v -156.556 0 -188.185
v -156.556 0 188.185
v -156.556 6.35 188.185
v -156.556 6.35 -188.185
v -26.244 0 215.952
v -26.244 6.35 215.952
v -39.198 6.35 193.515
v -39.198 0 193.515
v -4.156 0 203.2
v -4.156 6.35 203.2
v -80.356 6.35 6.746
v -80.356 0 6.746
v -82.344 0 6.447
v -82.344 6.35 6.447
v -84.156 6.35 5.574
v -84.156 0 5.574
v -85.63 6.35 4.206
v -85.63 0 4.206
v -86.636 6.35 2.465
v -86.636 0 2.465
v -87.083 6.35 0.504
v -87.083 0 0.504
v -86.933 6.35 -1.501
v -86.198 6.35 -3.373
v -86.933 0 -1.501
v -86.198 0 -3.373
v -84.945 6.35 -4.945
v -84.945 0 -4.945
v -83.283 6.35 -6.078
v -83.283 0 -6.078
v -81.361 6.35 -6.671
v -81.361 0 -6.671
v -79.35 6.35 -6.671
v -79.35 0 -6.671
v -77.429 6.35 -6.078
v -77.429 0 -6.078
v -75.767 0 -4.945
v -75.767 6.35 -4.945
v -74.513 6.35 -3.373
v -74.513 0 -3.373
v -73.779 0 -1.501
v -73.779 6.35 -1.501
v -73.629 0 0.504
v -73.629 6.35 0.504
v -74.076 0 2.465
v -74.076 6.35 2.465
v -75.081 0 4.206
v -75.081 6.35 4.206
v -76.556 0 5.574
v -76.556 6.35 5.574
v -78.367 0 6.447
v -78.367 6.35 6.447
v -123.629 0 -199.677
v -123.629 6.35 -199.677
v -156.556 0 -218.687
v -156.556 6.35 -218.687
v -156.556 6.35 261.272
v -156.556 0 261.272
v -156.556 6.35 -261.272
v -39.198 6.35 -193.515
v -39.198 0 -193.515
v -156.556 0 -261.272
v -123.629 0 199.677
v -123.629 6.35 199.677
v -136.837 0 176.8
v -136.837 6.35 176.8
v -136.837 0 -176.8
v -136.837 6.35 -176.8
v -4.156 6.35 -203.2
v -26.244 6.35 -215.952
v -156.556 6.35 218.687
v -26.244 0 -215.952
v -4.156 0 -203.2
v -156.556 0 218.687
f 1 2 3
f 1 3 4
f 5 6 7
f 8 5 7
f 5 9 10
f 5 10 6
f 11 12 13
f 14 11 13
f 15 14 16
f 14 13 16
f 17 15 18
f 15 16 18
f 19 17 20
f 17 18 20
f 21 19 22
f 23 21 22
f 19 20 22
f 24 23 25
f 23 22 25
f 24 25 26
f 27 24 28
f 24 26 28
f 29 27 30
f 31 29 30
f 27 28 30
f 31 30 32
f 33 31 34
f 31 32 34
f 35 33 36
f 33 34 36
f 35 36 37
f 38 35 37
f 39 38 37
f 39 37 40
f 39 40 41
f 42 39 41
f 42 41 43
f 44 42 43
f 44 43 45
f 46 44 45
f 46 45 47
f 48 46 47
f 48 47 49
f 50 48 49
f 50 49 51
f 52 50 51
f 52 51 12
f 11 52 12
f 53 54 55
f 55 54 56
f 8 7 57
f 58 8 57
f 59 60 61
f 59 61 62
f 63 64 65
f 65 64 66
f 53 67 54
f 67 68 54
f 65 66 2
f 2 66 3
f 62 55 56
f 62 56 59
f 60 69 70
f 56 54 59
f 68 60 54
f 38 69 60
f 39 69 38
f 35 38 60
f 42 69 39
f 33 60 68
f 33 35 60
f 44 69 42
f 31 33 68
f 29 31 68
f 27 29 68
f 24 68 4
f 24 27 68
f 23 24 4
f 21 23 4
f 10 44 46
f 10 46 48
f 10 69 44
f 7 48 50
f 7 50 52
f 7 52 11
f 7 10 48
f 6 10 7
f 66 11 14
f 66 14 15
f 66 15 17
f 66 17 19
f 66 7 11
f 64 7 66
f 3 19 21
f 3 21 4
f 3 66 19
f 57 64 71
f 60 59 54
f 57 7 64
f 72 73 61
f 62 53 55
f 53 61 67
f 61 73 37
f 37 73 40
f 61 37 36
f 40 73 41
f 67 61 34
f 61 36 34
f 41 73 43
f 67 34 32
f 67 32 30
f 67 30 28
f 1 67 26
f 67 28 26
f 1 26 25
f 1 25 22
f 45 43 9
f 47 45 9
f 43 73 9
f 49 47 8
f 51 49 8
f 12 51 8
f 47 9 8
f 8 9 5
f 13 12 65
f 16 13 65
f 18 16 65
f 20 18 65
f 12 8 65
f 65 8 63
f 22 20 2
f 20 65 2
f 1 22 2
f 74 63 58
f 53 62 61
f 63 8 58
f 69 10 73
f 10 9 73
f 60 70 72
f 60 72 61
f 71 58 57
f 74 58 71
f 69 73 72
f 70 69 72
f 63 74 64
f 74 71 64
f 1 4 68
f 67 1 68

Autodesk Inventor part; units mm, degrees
ref_plane "YZ Plane" through (0, 0, 0) normal (1, 0, 0) x (0, 1, 0)
ref_plane "XZ Plane" through (0, 0, 0) normal (0, 1, 0) x (-1, 0, 0)
ref_plane "XY Plane" through (0, 0, 0) normal (0, 0, 1) x (1, 0, 0)
sketch "Sketch1" plane through (0, 0, 0) normal (0, 1, 0) x (-1, 0, 0)
  line L0 (4.1559, 203.2) -> (4.1559, -203.2)
  line L1 (4.1559, -203.2) -> (156.5559, -291.1882)
  line L2 (4.1559, 203.2) -> (156.5559, 291.1882)
  line L3 (4.1559, 203.2) -> (180.1322, 203.2) construction
  line L4 (156.5559, 291.1882) -> (156.5559, -291.1882)
  point P0 (0, 0)
  point P1 (4.1559, 0)
  dimension "d0" = 120
  dimension "d1" = 30
  dimension "d2" = 406.4
  dimension "d5" = 152.4
extrude "Extrusion1" add sketch "Sketch1" along normal blind 6.35
sketch "Sketch3" plane through (0, 6.35, 0) normal (0, 1, 0) x (1, 0, 0)
  line L0 (-1236.8748, 812.4936) -> (-137.0225, 177.4936) projected
  line L1 (-1224.1748, 834.4907) -> (-1236.8748, 812.4936) projected
  line L2 (-124.3225, 199.4907) -> (-1224.1748, 834.4907) projected
  line L3 (-137.0225, 177.4936) -> (-124.3225, 199.4907) projected
  line L4 (-26.6836, 216.2064) -> (-1258.5181, 927.4064) projected
  line L5 (-39.3836, 194.2093) -> (-26.6836, 216.2064) projected
  line L6 (-1271.2181, 905.4093) -> (-39.3836, 194.2093) projected
  line L7 (-1258.5181, 927.4064) -> (-1271.2181, 905.4093) projected
  line L8 (-1258.5181, -927.4064) -> (-26.6836, -216.2064) projected
  line L9 (-1271.2181, -905.4093) -> (-1258.5181, -927.4064) projected
  line L10 (-39.3836, -194.2093) -> (-1271.2181, -905.4093) projected
  line L11 (-26.6836, -216.2064) -> (-39.3836, -194.2093) projected
  line L12 (-137.0225, -177.4936) -> (-1236.8748, -812.4936) projected
  line L13 (-124.3225, -199.4907) -> (-137.0225, -177.4936) projected
  line L14 (-1224.1748, -834.4907) -> (-124.3225, -199.4907) projected
  line L15 (-1236.8748, -812.4936) -> (-1224.1748, -834.4907) projected
  line L16 (-156.5559, 291.1882) -> (-156.5559, -291.1882) projected
  line L17 (-156.5559, -218.1006) -> (-156.5559, -188.7712)
  line L18 (-156.5559, -188.7712) -> (-137.0225, -177.4936)
  line L19 (-137.0225, -177.4936) -> (-124.3225, -199.4907)
  line L20 (-124.3225, -199.4907) -> (-156.5559, -218.1006)
  line L21 (-136.8366, -176.7997) -> (-157.0639, -188.4779)
  line L22 (-157.0639, -188.4779) -> (-157.0639, -218.9805)
  line L23 (-157.0639, -218.9805) -> (-123.6286, -199.6766)
  line L24 (-123.6286, -199.6766) -> (-136.8366, -176.7997)
  line L25 (-156.5559, -261.8588) -> (-156.5559, -291.1882)
  line L26 (-156.5559, -291.1882) -> (-26.6836, -216.2064)
  line L27 (-156.5559, -291.1882) -> (-4.1559, -203.2) projected
  line L28 (-26.6836, -216.2064) -> (-39.3836, -194.2093)
  line L29 (-39.3836, -194.2093) -> (-156.5559, -261.8588)
  line L30 (-157.0639, -261.5655) -> (-157.0639, -292.0681)
  line L31 (-157.0639, -292.0681) -> (-25.9896, -216.3923)
  line L32 (-25.9896, -216.3923) -> (-39.1976, -193.5154)
  line L33 (-39.1976, -193.5154) -> (-157.0639, -261.5655)
  line L34 (-156.5559, 218.1006) -> (-156.5559, 188.7712)
  line L35 (-156.5559, 188.7712) -> (-137.0225, 177.4936)
  line L36 (-137.0225, 177.4936) -> (-124.3225, 199.4907)
  line L37 (-124.3225, 199.4907) -> (-156.5559, 218.1006)
  line L38 (-157.0639, 218.9805) -> (-157.0639, 188.4779)
  line L39 (-157.0639, 188.4779) -> (-136.8366, 176.7997)
  line L40 (-136.8366, 176.7997) -> (-123.6286, 199.6766)
  line L41 (-123.6286, 199.6766) -> (-157.0639, 218.9805)
  line L42 (-156.5559, 261.8588) -> (-156.5559, 291.1882)
  line L43 (-156.5559, 291.1882) -> (-26.6836, 216.2064)
  line L44 (-26.6836, 216.2064) -> (-39.3836, 194.2093)
  line L45 (-39.3836, 194.2093) -> (-156.5559, 261.8588)
  line L46 (-157.0639, 261.5655) -> (-157.0639, 292.0681)
  line L47 (-157.0639, 292.0681) -> (-25.9896, 216.3923)
  line L48 (-25.9896, 216.3923) -> (-39.1976, 193.5154)
  line L49 (-39.1976, 193.5154) -> (-157.0639, 261.5655)
  point P0 (0, 0)
  dimension "d6" = 0.508
  dimension "d7" = 0.508
  dimension "d8" = 0.508
  dimension "d9" = 0.508
extrude "Extrusion2" cut sketch "Sketch3" against normal through all contours L16 L2 L3 L0 | L16 L39 L38 L0 | L0 L38 L2 L16 | L0 L3 L2 L16 L41 L40 L39 | L49 L46 L6 L16 | L16 L6 L5 L4 L46 L47 L48 L49 | L33 L32 L27 L11 L10 L16 | L16 L10 L30 L33 | L21 L24 L23 L16 L14 L13 L12 | L16 L12 L22 L21 | L0 L1 L2 L38 | L2 L38 L41 L16 | L16 L14 L22 L12 | L12 L13 L14 L16 | L16 L4 L5 L6 | L6 L46 L4 L16 | L22 L14 L15 L12 | L16 L23 L22 L14 | L16 L8 L30 L10 | L10 L11 L8 L16 | L8 L27 L32 L31 L30
sketch "Sketch4" plane through (0, 6.35, 0) normal (0, 1, 0) x (1, 0, 0)
  line L0 (-4.1559, -203.2) -> (-4.1559, 203.2) projected
  point P0 (0, 0)
  point P1 (-80.3559, 0)
  dimension "d12" = 76.2
  dimension "d13" = 203.2
hole "Hole1" at (-80.3559, 6.35, 0) direction (0, -1, 0) diameter 13.4925 end through all
properties part number "Triangle End"
